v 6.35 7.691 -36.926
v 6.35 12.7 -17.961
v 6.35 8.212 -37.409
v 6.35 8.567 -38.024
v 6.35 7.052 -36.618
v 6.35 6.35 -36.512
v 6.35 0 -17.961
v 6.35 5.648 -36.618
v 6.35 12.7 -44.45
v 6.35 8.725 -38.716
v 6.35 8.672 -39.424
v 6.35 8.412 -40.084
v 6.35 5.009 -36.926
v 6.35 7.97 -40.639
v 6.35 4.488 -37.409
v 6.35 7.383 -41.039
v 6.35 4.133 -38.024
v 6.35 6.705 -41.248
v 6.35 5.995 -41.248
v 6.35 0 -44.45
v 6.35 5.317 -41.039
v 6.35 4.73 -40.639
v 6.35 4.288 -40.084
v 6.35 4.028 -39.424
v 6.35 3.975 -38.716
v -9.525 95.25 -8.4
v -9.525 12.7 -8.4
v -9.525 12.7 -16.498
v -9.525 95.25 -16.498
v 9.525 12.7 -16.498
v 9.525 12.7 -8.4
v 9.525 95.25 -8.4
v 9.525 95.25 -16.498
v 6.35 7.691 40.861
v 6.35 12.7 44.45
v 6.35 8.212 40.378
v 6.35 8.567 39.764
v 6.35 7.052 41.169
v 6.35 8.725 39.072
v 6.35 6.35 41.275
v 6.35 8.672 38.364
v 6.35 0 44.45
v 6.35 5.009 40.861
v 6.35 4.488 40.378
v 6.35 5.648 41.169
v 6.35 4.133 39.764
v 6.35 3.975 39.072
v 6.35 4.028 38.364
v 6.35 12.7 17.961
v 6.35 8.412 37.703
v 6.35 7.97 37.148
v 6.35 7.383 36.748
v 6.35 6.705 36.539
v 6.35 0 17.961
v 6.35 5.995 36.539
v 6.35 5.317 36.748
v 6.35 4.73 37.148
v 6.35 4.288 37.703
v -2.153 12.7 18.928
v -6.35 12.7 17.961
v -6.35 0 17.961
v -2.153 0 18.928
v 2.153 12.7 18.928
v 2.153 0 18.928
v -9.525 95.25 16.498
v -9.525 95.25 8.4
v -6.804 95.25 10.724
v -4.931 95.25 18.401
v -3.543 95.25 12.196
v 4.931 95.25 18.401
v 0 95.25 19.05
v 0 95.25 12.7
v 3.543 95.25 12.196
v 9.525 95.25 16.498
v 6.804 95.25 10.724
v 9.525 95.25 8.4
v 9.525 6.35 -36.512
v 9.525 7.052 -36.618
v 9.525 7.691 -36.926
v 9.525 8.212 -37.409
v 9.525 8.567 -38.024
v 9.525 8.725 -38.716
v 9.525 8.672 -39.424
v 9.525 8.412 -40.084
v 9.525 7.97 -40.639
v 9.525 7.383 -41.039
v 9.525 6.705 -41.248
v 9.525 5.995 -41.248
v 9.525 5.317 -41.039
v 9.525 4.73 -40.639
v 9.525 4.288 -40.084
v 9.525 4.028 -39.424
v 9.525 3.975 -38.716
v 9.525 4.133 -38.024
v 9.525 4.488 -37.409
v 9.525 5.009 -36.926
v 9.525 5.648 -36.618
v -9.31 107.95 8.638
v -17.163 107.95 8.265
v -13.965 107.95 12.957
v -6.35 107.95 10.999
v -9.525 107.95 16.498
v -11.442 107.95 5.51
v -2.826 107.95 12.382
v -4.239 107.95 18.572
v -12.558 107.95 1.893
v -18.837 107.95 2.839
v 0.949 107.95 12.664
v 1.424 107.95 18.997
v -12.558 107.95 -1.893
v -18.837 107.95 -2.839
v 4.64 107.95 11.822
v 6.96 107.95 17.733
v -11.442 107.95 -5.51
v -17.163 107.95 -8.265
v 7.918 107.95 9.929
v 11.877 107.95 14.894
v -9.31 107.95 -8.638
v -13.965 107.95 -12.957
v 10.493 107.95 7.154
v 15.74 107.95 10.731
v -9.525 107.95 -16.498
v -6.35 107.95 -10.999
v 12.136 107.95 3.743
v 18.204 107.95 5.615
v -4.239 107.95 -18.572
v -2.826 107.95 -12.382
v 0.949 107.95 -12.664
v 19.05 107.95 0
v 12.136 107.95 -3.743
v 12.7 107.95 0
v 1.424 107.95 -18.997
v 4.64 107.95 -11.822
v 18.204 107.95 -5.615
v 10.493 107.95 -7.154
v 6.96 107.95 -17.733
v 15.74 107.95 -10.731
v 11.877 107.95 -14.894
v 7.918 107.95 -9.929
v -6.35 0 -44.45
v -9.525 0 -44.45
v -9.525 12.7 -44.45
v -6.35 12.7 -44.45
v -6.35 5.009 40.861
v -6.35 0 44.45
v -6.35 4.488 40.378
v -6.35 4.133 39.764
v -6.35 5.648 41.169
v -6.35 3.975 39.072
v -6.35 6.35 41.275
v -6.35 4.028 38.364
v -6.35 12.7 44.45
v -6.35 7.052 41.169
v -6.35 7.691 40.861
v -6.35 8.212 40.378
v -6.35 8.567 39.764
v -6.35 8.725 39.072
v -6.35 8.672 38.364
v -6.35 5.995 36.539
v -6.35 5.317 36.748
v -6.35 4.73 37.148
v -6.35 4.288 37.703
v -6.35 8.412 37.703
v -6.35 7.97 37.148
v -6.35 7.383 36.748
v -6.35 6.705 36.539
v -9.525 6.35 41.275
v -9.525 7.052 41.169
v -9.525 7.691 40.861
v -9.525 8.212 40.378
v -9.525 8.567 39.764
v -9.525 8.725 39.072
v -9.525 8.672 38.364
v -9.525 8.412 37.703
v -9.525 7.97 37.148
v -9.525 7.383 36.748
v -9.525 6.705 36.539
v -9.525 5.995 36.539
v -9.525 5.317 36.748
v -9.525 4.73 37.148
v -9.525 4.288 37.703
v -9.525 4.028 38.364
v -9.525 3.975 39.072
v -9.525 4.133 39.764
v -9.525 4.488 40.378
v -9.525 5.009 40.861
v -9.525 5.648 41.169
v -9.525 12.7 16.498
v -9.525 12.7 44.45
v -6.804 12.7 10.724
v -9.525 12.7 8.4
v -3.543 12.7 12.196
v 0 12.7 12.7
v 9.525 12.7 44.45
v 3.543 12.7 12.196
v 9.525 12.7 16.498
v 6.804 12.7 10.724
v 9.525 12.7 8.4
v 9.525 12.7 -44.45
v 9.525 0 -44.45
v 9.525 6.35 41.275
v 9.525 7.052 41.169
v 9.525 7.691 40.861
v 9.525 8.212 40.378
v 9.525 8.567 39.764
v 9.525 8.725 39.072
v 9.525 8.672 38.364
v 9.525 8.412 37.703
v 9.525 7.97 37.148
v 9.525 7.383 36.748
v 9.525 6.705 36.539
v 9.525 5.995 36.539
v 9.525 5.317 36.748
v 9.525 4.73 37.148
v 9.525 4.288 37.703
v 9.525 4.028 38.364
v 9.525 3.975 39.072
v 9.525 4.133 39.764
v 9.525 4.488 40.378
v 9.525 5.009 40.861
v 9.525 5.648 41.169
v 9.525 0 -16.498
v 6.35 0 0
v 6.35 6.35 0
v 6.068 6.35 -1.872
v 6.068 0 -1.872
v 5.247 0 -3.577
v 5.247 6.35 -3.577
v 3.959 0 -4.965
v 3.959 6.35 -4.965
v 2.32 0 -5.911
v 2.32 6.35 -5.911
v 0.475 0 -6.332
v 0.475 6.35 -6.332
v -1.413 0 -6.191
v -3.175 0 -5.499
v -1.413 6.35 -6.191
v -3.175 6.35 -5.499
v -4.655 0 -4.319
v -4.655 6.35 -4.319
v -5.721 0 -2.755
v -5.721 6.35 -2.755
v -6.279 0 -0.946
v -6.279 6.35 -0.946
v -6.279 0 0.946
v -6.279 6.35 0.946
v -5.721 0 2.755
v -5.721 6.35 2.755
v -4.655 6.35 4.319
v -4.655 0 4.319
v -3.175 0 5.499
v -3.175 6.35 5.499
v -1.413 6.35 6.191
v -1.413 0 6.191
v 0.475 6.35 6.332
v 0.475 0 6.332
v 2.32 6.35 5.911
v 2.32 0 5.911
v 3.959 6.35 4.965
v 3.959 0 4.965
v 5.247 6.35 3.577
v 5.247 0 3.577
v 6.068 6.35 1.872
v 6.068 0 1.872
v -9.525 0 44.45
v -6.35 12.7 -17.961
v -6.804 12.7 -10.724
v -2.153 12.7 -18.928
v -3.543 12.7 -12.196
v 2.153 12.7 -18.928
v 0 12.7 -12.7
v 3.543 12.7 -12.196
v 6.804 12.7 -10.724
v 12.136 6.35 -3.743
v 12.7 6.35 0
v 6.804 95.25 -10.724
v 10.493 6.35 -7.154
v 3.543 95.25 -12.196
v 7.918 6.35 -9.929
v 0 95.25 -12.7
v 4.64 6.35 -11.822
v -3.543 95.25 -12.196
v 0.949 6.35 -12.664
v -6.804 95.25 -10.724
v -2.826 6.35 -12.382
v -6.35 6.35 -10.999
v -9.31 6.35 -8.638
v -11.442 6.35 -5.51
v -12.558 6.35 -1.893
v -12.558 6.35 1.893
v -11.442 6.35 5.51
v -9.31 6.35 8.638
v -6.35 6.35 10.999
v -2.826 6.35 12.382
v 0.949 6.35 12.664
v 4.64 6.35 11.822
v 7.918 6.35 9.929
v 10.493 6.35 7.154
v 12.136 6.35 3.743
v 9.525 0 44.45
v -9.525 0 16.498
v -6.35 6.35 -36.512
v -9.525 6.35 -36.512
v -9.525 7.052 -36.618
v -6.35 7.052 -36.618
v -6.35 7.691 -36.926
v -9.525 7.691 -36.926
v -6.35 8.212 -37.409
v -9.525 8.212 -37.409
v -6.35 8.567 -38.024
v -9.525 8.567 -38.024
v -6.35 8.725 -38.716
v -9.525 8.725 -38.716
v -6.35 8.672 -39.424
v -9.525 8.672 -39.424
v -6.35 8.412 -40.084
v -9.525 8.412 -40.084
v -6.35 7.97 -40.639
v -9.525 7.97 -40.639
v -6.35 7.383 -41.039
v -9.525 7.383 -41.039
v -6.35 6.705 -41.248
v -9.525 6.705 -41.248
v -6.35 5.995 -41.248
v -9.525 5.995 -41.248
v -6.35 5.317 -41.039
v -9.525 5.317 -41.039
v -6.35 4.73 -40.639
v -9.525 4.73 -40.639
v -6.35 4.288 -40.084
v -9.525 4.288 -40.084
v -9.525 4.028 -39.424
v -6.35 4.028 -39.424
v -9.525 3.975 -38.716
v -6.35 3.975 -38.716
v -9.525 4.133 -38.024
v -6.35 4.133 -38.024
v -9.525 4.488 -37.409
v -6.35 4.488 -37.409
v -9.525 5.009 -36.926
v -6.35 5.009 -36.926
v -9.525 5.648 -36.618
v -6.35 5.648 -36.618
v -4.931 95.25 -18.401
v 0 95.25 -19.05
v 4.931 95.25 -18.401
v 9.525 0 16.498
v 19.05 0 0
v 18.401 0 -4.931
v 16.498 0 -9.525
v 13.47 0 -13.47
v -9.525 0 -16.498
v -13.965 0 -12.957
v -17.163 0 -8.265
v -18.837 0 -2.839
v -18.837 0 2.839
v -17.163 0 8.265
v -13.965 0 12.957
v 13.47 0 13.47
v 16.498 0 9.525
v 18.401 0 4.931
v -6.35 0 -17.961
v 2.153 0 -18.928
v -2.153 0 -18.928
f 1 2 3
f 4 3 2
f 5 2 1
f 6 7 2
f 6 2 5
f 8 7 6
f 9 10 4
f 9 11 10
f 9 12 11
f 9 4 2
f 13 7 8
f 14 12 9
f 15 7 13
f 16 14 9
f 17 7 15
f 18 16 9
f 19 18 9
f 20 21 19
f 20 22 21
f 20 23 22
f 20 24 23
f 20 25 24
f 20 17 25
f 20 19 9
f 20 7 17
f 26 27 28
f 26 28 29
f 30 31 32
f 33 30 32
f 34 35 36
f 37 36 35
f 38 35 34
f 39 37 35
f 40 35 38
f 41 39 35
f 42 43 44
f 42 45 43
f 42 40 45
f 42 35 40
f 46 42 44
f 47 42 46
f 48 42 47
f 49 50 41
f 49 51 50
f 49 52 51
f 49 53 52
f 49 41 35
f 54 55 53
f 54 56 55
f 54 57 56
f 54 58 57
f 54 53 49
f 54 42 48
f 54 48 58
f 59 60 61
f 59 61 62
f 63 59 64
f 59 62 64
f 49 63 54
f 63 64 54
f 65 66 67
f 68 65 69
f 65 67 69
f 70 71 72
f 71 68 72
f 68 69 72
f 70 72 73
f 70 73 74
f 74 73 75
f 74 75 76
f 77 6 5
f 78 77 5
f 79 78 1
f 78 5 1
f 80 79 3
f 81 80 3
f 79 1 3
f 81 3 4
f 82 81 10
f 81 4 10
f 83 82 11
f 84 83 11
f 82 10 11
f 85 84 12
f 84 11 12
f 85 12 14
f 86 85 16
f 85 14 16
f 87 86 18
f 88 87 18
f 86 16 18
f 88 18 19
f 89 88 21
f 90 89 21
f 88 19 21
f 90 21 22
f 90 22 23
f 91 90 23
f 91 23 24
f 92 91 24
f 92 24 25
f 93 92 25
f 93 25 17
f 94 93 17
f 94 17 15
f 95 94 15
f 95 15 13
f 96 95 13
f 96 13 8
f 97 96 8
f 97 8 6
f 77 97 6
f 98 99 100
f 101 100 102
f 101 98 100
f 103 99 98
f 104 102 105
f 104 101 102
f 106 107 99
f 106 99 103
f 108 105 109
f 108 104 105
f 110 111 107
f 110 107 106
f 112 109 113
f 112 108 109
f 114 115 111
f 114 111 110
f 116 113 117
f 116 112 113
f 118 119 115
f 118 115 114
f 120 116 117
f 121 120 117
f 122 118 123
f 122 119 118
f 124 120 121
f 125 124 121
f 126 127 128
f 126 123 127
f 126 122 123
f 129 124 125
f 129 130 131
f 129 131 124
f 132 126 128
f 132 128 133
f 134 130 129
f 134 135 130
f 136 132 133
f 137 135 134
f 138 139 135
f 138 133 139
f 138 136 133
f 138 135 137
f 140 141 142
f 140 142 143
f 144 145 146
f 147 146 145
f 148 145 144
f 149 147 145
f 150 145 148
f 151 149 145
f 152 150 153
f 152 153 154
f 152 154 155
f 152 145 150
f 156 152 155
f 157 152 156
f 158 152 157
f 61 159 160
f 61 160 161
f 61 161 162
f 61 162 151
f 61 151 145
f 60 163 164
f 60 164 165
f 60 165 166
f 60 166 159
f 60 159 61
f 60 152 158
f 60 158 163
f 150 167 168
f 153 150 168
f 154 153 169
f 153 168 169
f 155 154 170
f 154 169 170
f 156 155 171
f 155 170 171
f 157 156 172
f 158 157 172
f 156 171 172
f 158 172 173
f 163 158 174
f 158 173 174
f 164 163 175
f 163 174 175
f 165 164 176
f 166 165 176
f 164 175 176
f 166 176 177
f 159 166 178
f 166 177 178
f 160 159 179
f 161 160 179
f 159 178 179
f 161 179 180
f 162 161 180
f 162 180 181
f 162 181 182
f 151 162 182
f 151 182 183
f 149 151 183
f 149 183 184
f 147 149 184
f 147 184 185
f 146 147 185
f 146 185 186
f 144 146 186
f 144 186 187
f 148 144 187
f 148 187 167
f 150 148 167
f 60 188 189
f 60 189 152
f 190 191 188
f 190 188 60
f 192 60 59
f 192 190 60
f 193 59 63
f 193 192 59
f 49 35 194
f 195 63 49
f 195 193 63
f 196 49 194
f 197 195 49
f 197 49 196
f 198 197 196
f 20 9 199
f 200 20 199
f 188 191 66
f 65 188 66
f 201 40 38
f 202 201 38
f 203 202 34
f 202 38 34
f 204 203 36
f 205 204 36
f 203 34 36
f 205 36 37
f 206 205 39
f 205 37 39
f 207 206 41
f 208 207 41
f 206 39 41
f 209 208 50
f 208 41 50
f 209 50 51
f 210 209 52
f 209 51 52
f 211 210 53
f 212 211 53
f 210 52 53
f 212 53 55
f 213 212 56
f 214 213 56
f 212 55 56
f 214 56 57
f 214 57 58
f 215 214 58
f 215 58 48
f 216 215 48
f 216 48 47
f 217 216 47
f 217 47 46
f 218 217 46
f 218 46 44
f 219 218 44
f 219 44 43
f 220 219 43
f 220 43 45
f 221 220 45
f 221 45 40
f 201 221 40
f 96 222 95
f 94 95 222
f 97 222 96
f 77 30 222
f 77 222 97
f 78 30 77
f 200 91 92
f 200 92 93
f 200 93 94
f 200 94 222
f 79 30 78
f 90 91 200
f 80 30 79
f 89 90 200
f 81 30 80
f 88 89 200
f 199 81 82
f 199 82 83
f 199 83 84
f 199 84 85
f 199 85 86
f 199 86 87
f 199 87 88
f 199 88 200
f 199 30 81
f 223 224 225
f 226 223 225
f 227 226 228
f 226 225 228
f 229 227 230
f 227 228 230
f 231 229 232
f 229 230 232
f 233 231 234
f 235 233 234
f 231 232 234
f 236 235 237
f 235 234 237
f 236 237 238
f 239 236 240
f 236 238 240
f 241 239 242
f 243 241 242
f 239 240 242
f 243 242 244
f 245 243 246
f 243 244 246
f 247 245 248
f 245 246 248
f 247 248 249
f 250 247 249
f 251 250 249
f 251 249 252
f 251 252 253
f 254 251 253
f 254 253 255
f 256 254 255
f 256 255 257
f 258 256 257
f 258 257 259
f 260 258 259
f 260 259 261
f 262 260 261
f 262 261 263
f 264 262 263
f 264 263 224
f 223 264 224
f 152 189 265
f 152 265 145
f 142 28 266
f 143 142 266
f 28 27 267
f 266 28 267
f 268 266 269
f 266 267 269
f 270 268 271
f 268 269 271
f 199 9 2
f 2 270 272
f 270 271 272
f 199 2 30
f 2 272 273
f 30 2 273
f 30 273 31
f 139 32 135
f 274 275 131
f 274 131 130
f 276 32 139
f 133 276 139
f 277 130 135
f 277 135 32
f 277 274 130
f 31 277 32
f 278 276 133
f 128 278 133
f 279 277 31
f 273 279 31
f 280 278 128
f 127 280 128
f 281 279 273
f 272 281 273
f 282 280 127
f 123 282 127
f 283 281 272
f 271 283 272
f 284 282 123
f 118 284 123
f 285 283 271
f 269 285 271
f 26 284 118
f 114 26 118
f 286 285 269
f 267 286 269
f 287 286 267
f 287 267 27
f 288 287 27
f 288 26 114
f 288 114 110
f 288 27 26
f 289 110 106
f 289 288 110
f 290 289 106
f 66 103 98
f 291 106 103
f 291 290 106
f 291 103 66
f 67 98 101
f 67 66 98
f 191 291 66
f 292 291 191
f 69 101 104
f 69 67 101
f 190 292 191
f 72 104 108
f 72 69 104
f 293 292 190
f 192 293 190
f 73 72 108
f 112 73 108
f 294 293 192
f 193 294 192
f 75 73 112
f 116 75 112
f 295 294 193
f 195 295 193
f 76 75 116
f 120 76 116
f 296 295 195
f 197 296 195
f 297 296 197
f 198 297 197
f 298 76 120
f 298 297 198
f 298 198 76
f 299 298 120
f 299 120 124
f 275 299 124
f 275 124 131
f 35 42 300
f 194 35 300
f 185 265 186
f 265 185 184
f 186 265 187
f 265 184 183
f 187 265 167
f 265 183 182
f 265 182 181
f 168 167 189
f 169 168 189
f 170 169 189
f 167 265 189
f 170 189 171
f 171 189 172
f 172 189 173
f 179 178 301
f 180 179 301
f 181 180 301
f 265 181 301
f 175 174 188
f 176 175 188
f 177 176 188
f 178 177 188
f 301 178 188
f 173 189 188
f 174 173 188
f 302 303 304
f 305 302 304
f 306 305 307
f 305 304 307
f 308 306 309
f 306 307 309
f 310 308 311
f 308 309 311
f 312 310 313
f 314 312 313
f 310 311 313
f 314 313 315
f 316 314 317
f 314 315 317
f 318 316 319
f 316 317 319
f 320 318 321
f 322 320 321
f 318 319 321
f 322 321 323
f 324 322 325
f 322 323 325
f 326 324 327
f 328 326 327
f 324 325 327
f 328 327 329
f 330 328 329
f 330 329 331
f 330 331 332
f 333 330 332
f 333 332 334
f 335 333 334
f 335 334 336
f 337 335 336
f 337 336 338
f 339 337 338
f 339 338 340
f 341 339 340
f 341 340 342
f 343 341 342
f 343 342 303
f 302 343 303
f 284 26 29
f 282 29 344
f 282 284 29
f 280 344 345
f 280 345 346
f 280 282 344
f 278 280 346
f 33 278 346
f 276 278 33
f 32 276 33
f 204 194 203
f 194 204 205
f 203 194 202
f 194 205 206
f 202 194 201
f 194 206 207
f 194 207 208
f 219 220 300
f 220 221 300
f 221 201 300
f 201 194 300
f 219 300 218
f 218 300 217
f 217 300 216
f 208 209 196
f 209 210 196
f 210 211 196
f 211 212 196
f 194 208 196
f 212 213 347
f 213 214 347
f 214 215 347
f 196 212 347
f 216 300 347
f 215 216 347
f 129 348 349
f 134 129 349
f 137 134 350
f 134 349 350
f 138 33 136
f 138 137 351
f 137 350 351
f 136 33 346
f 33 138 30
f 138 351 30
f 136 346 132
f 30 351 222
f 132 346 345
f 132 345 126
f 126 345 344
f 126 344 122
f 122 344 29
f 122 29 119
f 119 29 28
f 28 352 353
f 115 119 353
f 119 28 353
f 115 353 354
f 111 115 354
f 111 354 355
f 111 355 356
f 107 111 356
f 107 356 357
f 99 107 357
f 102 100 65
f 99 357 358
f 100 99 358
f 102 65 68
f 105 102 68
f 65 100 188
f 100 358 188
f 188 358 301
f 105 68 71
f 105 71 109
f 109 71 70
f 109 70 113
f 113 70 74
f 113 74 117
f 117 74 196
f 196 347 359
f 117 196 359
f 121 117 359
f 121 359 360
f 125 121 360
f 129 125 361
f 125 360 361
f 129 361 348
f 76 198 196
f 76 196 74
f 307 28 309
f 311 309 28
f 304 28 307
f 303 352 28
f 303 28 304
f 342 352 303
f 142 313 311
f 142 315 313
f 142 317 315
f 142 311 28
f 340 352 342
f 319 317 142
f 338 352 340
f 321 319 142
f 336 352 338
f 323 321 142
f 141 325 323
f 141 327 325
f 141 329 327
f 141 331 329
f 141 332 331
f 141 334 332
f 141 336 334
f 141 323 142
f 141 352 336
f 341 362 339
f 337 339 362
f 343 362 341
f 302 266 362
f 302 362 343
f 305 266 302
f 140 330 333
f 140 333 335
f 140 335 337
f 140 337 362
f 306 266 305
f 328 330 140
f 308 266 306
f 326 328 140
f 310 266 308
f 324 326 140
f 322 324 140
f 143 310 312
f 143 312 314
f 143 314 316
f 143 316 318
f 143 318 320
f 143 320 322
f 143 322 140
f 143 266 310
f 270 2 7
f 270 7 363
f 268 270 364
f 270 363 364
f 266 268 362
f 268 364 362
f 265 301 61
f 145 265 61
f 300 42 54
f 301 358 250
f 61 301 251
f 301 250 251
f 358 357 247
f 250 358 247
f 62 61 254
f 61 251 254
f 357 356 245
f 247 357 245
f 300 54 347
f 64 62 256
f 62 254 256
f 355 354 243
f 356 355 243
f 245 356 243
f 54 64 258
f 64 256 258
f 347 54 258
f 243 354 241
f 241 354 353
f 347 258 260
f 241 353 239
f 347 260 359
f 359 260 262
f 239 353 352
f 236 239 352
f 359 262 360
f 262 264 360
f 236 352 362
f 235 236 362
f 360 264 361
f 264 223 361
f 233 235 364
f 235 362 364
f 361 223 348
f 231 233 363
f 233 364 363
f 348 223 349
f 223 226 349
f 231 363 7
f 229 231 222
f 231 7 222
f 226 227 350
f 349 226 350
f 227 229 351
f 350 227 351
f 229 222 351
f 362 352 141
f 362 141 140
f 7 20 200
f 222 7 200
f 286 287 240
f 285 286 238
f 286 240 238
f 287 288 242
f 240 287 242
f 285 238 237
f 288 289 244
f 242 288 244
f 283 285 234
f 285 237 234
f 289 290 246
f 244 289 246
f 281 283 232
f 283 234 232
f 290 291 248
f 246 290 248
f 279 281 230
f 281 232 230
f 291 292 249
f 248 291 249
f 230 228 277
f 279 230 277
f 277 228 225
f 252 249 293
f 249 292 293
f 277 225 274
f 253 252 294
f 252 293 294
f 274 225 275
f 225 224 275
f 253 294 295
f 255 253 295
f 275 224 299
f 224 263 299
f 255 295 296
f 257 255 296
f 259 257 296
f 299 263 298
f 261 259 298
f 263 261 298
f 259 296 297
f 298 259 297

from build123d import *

# Parameters (mm, degrees)
SKETCH1_R                = 19.05
SKETCH1_R_2              = 12.7
BOSS_EXTRUDE1_DEPTH      = 107.95
SKETCH2_R                = 13.97
BOSS_EXTRUDE2_DEPTH      = 6.35
SKETCH8_W                = 19.05
SKETCH8_H                = 82.55
CUT_EXTRUDE6_DEPTH       = 20.05
CUT_EXTRUDE6_DEPTH_BACK  = 20.05
SKETCH7_R                = 6.35
CUT_EXTRUDE4_DEPTH       = 7.35
SKETCH9_W                = 3.175
SKETCH9_H                = 27.952216058
BOSS_EXTRUDE3_DEPTH      = 6.35
BOSS_EXTRUDE3_DEPTH_BACK = 6.35
SKETCH10_R               = 2.38125
CUT_EXTRUDE7_DEPTH       = 29.575


with BuildPart() as part:
    # Sketch1 → Boss-Extrude1 (new body)
    with BuildSketch(Plane(origin=(0, 0, 0), x_dir=(1, 0, 0), z_dir=(0, 1, 0))):
        Circle(SKETCH1_R)
        Circle(SKETCH1_R_2, mode=Mode.SUBTRACT)
    extrude(amount=BOSS_EXTRUDE1_DEPTH)

    # Sketch2 → Boss-Extrude2 (add)
    with BuildSketch(Plane.XZ):
        Circle(SKETCH2_R)
    extrude(amount=-BOSS_EXTRUDE2_DEPTH)

    # Sketch8 → Cut-Extrude6 (cut, two sides)
    with BuildSketch(Plane.XY) as cut_extrude6_sk:
        with Locations((0, 53.975)):
            Rectangle(SKETCH8_W, SKETCH8_H)
    extrude(amount=CUT_EXTRUDE6_DEPTH, mode=Mode.SUBTRACT)
    extrude(cut_extrude6_sk.sketch, amount=-CUT_EXTRUDE6_DEPTH_BACK, mode=Mode.SUBTRACT)

    # Sketch7 → Cut-Extrude4 (cut, through all)
    with BuildSketch(Plane(origin=(0, 6.35, 0), x_dir=(1, 0, 0), z_dir=(0, 1, 0))):
        Circle(SKETCH7_R)
    extrude(amount=-CUT_EXTRUDE4_DEPTH, mode=Mode.SUBTRACT)

    # Sketch9 → Boss-Extrude3 (add, two sides)
    with BuildSketch(Plane(origin=(0, 6.35, 0), x_dir=(1, 0, 0), z_dir=(0, 1, 0))) as boss_extrude3_sk:
        with Locations((-7.9375, -30.473891971)):
            Rectangle(SKETCH9_W, SKETCH9_H)
        with Locations((7.9375, -30.473891971)):
            Rectangle(SKETCH9_W, SKETCH9_H)
        with Locations((7.9375, 30.473891971)):
            Rectangle(SKETCH9_W, SKETCH9_H)
        with Locations((-7.9375, 30.473891971)):
            Rectangle(SKETCH9_W, SKETCH9_H)
    extrude(amount=BOSS_EXTRUDE3_DEPTH)
    extrude(boss_extrude3_sk.sketch, amount=-BOSS_EXTRUDE3_DEPTH_BACK)

    # Sketch10 → Cut-Extrude7 (cut, through all)
    with BuildSketch(Plane.ZY.offset(9.525)):
        with Locations((-38.89375, 6.35)):
            Circle(SKETCH10_R)
        with Locations((38.89375, 6.35)):
            Circle(SKETCH10_R)
    extrude(amount=-CUT_EXTRUDE7_DEPTH, mode=Mode.SUBTRACT)


solid = part.part
